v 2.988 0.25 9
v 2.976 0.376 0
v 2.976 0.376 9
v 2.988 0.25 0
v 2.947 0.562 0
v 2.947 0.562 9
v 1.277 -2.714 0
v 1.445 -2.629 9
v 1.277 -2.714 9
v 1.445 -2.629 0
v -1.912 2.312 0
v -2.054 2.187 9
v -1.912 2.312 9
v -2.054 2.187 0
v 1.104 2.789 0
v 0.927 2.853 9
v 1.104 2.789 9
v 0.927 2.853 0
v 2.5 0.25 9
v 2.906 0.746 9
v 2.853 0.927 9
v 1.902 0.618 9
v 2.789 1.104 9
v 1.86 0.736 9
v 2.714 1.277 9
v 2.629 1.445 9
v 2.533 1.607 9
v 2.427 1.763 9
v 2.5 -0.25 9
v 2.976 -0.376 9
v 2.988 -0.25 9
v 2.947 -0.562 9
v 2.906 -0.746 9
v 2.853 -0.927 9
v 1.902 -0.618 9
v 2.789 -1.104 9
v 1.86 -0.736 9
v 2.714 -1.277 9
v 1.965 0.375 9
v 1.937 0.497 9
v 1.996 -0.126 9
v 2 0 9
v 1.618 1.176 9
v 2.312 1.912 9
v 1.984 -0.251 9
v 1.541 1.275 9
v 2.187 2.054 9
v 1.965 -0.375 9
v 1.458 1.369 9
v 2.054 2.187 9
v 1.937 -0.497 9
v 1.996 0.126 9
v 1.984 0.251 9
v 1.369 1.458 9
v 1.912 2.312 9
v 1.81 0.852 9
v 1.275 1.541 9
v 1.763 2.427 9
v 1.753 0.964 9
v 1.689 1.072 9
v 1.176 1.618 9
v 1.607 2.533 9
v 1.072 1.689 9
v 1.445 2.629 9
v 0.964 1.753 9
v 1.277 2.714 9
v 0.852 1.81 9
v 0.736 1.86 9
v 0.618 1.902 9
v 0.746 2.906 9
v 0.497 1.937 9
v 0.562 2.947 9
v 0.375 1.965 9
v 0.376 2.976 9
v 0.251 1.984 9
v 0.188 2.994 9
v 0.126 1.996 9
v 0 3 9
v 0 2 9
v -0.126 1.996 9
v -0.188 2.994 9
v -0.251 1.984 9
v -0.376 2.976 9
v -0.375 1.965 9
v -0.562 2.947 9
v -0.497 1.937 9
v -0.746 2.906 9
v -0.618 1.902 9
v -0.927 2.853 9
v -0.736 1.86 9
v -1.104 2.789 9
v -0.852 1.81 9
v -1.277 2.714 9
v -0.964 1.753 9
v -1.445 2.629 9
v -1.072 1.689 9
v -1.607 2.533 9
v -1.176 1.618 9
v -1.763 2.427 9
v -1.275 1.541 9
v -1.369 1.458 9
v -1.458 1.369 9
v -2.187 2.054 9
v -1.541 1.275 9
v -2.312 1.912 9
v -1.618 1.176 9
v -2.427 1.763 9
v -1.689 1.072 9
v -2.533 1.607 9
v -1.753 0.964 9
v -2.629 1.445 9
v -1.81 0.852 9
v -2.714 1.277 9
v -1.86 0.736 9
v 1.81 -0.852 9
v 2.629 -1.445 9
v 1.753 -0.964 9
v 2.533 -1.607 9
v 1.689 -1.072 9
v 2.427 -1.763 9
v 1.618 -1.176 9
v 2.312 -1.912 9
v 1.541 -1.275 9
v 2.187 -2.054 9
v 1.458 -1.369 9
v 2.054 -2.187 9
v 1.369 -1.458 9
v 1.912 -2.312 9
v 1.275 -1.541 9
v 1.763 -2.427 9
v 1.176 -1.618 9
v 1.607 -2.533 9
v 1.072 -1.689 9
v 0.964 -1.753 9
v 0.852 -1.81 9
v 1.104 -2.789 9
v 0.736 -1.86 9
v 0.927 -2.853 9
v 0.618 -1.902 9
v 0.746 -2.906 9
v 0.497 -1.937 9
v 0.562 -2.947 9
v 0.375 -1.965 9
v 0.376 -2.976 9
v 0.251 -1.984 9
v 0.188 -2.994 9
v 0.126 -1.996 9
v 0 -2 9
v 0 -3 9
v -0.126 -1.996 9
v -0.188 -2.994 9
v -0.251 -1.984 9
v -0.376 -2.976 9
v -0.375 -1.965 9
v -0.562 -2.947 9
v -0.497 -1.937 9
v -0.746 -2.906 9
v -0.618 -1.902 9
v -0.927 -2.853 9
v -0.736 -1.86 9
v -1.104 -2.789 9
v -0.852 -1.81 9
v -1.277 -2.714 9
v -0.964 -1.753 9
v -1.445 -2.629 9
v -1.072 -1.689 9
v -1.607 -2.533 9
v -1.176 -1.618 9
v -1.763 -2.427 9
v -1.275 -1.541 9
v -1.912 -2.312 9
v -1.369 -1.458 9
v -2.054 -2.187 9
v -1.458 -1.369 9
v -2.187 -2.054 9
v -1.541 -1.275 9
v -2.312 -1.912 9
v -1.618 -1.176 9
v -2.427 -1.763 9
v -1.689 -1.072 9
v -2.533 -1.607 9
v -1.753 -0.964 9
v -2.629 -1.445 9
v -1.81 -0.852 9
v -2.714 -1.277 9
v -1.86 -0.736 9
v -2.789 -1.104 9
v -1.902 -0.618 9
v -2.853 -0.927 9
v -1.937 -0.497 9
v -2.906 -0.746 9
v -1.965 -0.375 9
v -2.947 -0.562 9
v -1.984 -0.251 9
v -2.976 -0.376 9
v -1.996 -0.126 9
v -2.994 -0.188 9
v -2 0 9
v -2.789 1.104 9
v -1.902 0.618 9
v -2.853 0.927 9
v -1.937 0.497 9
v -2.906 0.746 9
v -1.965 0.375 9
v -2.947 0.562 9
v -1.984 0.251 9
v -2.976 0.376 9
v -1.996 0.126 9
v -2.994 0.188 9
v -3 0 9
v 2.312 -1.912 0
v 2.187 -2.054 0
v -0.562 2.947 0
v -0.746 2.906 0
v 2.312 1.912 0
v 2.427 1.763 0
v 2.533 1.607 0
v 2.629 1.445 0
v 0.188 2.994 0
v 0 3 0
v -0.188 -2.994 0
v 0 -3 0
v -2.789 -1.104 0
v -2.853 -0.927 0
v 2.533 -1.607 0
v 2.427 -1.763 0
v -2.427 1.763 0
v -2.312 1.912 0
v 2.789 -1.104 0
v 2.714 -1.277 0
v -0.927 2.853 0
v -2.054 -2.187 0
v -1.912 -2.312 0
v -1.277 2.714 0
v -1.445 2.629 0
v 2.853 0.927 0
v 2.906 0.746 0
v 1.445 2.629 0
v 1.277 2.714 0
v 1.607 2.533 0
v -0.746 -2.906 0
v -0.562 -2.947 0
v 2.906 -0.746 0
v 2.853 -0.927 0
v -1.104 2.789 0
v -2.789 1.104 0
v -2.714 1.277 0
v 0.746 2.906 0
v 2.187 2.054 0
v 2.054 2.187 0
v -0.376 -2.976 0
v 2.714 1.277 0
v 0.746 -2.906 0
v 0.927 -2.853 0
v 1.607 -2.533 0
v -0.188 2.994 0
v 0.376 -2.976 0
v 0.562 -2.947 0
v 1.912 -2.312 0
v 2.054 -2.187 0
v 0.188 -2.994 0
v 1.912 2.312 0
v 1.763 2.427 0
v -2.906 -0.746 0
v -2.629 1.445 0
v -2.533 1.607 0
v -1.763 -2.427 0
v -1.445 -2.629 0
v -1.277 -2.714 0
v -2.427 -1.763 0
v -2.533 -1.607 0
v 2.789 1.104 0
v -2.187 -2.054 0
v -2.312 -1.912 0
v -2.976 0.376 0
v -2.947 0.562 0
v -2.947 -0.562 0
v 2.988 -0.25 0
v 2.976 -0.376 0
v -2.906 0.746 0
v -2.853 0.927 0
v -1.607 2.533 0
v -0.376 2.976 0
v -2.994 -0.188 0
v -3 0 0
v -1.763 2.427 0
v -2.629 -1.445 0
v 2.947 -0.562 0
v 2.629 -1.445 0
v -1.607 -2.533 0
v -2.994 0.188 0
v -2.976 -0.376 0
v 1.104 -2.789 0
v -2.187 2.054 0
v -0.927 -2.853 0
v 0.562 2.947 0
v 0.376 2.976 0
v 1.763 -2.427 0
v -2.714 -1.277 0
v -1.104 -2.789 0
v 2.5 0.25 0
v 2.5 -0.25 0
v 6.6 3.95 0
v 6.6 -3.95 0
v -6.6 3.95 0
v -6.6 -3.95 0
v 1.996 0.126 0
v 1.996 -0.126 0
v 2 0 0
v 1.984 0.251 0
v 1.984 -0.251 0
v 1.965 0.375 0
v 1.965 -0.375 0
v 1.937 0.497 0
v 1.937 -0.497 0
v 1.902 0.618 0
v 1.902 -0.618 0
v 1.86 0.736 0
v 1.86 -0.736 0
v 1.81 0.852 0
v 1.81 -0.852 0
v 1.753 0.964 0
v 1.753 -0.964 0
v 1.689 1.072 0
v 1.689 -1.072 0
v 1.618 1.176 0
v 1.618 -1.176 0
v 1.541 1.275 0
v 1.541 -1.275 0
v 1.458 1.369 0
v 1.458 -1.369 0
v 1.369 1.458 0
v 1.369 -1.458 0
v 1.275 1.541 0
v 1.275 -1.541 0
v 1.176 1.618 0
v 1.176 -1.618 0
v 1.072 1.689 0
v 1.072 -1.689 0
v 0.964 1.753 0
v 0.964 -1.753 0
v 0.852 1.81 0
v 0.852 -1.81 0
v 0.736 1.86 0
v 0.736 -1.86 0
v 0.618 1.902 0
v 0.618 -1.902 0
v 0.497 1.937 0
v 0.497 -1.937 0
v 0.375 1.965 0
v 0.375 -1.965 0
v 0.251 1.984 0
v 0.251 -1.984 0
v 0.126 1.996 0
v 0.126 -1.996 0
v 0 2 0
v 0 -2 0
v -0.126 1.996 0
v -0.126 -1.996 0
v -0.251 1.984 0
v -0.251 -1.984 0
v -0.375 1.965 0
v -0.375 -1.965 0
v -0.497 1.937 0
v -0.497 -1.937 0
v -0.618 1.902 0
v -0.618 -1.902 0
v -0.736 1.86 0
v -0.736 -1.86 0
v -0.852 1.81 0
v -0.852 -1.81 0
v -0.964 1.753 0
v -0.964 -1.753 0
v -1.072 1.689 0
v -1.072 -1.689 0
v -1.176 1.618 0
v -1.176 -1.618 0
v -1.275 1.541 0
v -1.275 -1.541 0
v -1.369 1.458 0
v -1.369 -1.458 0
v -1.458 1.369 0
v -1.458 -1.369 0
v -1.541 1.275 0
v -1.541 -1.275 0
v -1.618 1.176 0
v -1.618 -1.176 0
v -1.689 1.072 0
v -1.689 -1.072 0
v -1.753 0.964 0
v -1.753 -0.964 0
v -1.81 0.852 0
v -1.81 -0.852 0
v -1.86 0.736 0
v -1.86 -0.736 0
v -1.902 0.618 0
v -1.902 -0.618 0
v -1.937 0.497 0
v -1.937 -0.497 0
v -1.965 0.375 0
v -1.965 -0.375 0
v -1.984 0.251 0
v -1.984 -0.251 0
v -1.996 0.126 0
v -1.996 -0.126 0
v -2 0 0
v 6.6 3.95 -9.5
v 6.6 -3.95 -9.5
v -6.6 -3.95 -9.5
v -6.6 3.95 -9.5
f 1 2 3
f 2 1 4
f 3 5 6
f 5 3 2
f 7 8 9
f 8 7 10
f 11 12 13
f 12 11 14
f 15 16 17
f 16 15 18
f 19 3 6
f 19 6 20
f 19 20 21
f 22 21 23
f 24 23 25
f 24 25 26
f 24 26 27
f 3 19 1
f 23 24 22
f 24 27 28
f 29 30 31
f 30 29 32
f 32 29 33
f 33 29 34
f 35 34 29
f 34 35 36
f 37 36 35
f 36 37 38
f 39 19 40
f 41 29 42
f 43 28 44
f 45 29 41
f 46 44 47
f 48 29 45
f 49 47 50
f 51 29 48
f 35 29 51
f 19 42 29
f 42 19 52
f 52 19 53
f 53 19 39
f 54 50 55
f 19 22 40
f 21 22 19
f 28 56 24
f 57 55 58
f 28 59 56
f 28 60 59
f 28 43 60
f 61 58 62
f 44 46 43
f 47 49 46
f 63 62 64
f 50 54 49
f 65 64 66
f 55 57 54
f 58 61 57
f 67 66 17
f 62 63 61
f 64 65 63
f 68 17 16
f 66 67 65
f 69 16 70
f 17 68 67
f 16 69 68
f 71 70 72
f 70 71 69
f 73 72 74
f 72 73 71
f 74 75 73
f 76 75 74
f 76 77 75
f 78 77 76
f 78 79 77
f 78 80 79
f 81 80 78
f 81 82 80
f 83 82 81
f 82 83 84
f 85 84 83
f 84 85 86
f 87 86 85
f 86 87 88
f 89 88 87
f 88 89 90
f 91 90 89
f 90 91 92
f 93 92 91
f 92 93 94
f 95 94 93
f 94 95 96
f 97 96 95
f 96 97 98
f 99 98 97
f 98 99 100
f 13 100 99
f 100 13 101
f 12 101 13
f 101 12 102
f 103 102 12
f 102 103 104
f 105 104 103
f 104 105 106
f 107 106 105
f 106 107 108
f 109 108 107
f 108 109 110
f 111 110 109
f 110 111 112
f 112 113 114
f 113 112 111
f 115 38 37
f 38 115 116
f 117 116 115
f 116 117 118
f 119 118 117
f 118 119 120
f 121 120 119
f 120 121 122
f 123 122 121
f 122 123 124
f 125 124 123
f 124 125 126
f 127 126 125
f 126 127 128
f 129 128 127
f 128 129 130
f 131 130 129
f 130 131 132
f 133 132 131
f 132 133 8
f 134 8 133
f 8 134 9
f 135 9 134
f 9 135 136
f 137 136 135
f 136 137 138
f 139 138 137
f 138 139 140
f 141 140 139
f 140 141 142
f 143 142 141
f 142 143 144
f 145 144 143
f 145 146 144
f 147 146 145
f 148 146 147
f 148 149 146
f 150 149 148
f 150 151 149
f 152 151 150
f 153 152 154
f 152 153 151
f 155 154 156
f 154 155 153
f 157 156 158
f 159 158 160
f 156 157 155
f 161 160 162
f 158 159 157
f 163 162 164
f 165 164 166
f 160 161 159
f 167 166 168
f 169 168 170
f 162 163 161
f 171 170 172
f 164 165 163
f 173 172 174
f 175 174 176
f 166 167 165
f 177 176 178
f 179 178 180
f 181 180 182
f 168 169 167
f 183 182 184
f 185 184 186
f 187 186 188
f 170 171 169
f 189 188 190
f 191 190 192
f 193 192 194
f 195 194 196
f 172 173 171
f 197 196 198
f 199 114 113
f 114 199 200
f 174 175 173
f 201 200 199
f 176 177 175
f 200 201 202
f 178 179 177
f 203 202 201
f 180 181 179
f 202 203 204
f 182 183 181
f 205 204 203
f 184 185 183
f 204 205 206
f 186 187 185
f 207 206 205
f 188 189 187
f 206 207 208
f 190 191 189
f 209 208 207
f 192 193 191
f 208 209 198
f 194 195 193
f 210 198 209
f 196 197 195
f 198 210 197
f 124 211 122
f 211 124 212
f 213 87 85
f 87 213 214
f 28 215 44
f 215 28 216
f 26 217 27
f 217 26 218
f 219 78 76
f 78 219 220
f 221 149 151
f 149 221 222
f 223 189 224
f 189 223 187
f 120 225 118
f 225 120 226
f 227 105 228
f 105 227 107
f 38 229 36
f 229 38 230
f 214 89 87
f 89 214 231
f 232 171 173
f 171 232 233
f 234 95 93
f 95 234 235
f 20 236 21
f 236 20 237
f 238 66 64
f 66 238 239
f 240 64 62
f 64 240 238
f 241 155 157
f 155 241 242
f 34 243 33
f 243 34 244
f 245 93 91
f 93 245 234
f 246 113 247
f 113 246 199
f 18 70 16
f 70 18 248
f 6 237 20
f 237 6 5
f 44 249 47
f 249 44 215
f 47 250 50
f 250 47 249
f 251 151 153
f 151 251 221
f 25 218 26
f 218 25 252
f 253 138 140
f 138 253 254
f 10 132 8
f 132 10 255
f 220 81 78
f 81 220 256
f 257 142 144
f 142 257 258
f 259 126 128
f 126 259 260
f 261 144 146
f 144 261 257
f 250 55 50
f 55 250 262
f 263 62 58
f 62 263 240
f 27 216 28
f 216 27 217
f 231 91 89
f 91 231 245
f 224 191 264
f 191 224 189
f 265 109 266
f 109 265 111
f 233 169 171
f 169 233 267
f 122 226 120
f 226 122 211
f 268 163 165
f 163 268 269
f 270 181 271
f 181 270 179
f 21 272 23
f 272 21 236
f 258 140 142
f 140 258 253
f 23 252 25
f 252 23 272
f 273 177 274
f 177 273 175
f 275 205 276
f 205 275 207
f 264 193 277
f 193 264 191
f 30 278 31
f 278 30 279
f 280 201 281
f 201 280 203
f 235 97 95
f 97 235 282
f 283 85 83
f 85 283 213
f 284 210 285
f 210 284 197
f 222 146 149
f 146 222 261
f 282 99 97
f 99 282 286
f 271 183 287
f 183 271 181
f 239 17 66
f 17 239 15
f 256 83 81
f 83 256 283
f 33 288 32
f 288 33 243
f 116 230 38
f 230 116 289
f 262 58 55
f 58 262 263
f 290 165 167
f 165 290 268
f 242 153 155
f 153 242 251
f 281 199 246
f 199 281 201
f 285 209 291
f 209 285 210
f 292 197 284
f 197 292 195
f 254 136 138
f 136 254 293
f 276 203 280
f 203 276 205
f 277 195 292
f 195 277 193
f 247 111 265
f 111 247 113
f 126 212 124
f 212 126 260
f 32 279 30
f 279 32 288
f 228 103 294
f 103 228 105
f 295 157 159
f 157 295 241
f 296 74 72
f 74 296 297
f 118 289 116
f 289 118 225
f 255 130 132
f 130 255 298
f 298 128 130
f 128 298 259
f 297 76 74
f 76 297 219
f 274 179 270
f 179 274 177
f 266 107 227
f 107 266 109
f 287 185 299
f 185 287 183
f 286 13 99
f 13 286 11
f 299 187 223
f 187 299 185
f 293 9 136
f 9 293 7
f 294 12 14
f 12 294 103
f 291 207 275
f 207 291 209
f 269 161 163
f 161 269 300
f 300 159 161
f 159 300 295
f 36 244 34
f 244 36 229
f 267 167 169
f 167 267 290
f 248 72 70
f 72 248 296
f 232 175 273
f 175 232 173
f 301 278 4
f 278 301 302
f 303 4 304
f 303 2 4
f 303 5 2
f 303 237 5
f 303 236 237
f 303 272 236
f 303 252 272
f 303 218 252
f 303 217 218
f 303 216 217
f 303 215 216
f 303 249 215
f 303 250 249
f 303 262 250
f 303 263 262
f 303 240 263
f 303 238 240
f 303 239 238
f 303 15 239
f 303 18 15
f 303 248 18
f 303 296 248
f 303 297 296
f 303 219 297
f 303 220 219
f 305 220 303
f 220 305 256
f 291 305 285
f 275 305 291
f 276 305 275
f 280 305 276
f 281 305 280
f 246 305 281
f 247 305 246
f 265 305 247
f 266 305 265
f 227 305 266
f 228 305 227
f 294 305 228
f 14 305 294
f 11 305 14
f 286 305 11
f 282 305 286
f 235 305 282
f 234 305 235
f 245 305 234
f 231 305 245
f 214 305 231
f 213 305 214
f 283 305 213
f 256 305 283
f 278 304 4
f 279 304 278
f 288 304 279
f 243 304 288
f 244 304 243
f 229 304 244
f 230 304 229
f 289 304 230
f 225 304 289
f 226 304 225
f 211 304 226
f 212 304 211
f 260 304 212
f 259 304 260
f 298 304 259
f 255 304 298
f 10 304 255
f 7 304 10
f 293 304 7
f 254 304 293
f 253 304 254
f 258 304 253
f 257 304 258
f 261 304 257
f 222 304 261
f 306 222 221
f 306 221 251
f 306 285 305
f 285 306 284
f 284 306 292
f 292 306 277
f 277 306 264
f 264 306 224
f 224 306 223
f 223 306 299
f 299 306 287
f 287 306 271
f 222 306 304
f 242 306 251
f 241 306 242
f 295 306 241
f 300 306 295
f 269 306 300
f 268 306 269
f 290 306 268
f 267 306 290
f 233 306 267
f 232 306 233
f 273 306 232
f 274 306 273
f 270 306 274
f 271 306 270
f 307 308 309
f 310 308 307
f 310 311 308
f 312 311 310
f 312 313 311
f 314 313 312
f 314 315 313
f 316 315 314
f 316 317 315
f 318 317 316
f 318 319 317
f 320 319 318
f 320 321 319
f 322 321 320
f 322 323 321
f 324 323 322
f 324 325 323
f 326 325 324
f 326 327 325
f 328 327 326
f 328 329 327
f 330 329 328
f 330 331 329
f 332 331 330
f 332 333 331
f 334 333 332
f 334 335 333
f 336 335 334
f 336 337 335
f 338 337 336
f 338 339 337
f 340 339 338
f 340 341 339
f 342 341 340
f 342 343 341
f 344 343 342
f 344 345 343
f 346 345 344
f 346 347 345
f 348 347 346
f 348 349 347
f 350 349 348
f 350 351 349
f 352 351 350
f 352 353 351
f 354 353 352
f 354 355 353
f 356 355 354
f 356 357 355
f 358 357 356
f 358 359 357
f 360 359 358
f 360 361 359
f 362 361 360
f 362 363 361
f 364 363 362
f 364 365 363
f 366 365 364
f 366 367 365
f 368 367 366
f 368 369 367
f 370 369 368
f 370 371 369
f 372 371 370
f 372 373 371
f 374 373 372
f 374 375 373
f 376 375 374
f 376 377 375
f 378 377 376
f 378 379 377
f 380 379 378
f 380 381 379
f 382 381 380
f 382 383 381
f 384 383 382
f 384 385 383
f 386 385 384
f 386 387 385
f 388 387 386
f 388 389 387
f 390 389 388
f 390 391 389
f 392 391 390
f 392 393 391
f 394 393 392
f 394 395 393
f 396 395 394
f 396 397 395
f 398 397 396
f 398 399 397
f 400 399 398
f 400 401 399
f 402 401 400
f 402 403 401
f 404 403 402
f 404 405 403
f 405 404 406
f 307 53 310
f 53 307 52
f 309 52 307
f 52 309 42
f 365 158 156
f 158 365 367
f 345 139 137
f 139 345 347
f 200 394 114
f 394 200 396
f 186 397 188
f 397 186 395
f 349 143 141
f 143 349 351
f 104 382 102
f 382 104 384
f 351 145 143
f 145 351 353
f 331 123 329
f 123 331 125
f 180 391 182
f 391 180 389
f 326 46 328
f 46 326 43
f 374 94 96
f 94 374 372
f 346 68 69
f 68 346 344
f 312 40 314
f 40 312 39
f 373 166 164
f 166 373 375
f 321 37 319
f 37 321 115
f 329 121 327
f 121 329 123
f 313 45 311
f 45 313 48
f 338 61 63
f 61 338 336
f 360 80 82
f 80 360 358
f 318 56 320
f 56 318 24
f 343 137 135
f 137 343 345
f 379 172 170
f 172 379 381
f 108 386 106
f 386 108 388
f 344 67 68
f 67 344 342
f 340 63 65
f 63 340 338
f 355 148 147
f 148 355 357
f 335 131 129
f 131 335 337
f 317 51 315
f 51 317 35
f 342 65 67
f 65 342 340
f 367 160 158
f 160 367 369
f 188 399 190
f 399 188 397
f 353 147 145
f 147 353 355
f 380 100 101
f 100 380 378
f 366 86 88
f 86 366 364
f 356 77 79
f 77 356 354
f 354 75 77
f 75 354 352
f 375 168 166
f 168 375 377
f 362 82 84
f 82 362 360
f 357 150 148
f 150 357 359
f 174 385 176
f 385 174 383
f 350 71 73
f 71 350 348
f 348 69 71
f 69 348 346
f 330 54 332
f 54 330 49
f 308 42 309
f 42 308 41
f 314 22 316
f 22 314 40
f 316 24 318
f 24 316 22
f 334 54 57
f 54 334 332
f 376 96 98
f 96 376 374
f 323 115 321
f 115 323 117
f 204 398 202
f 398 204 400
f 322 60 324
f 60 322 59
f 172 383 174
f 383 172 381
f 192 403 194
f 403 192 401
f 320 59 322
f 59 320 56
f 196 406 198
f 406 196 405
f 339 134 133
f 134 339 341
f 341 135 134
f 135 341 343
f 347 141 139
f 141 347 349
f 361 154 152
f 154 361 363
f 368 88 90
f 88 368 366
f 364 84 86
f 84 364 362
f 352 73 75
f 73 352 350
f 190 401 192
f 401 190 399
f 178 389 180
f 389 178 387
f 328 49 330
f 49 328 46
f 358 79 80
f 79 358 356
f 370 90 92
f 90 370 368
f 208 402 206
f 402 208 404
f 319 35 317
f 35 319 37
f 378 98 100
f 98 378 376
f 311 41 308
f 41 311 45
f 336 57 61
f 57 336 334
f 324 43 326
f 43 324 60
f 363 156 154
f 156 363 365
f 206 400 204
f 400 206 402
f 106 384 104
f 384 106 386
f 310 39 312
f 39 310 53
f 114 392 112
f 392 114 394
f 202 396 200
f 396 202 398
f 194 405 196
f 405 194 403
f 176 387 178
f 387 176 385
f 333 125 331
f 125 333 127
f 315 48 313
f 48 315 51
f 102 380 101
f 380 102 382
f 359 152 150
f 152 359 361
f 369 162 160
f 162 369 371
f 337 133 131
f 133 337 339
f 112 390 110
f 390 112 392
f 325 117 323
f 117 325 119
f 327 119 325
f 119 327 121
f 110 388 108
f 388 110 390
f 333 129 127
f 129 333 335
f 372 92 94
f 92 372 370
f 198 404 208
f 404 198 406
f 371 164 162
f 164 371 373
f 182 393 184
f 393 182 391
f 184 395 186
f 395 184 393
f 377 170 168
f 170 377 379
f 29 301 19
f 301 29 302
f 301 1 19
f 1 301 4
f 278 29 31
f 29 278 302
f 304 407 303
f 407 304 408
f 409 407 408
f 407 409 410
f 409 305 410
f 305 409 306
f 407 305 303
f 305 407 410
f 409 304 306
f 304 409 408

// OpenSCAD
// file: ../toggle-switches.scad
mts_raster = 4.7;
mts_corpus_h = 9.5;
mts_column_l = 13.2;
mts_column_w = 7.9;
mts_affix_inset = 0.5;
mts_mounting_thread_d = 6;
mts_mounting_thread_h = 9;

module mts_toggle_switch(columns = 1) {
  for (column = [1 : columns]) {
    translate([-mts_column_l / 2, (mts_column_w * (columns / 2)) - column * mts_column_w, -mts_corpus_h])
      cube([mts_column_l, mts_column_w, mts_corpus_h]);
  }

  difference() {
    cylinder(d = mts_mounting_thread_d, h = mts_mounting_thread_h);
    cylinder(d = mts_mounting_thread_d - 4 * mts_affix_inset, h = mts_mounting_thread_h);

    translate([mts_mounting_thread_d / 2 - mts_affix_inset, -mts_affix_inset / 2, 0])
      cube([mts_affix_inset, mts_affix_inset, mts_mounting_thread_h]);
  }
}
// main file
use <../toggle-switches.scad>;
$fn = 100;
mts_toggle_switch();
